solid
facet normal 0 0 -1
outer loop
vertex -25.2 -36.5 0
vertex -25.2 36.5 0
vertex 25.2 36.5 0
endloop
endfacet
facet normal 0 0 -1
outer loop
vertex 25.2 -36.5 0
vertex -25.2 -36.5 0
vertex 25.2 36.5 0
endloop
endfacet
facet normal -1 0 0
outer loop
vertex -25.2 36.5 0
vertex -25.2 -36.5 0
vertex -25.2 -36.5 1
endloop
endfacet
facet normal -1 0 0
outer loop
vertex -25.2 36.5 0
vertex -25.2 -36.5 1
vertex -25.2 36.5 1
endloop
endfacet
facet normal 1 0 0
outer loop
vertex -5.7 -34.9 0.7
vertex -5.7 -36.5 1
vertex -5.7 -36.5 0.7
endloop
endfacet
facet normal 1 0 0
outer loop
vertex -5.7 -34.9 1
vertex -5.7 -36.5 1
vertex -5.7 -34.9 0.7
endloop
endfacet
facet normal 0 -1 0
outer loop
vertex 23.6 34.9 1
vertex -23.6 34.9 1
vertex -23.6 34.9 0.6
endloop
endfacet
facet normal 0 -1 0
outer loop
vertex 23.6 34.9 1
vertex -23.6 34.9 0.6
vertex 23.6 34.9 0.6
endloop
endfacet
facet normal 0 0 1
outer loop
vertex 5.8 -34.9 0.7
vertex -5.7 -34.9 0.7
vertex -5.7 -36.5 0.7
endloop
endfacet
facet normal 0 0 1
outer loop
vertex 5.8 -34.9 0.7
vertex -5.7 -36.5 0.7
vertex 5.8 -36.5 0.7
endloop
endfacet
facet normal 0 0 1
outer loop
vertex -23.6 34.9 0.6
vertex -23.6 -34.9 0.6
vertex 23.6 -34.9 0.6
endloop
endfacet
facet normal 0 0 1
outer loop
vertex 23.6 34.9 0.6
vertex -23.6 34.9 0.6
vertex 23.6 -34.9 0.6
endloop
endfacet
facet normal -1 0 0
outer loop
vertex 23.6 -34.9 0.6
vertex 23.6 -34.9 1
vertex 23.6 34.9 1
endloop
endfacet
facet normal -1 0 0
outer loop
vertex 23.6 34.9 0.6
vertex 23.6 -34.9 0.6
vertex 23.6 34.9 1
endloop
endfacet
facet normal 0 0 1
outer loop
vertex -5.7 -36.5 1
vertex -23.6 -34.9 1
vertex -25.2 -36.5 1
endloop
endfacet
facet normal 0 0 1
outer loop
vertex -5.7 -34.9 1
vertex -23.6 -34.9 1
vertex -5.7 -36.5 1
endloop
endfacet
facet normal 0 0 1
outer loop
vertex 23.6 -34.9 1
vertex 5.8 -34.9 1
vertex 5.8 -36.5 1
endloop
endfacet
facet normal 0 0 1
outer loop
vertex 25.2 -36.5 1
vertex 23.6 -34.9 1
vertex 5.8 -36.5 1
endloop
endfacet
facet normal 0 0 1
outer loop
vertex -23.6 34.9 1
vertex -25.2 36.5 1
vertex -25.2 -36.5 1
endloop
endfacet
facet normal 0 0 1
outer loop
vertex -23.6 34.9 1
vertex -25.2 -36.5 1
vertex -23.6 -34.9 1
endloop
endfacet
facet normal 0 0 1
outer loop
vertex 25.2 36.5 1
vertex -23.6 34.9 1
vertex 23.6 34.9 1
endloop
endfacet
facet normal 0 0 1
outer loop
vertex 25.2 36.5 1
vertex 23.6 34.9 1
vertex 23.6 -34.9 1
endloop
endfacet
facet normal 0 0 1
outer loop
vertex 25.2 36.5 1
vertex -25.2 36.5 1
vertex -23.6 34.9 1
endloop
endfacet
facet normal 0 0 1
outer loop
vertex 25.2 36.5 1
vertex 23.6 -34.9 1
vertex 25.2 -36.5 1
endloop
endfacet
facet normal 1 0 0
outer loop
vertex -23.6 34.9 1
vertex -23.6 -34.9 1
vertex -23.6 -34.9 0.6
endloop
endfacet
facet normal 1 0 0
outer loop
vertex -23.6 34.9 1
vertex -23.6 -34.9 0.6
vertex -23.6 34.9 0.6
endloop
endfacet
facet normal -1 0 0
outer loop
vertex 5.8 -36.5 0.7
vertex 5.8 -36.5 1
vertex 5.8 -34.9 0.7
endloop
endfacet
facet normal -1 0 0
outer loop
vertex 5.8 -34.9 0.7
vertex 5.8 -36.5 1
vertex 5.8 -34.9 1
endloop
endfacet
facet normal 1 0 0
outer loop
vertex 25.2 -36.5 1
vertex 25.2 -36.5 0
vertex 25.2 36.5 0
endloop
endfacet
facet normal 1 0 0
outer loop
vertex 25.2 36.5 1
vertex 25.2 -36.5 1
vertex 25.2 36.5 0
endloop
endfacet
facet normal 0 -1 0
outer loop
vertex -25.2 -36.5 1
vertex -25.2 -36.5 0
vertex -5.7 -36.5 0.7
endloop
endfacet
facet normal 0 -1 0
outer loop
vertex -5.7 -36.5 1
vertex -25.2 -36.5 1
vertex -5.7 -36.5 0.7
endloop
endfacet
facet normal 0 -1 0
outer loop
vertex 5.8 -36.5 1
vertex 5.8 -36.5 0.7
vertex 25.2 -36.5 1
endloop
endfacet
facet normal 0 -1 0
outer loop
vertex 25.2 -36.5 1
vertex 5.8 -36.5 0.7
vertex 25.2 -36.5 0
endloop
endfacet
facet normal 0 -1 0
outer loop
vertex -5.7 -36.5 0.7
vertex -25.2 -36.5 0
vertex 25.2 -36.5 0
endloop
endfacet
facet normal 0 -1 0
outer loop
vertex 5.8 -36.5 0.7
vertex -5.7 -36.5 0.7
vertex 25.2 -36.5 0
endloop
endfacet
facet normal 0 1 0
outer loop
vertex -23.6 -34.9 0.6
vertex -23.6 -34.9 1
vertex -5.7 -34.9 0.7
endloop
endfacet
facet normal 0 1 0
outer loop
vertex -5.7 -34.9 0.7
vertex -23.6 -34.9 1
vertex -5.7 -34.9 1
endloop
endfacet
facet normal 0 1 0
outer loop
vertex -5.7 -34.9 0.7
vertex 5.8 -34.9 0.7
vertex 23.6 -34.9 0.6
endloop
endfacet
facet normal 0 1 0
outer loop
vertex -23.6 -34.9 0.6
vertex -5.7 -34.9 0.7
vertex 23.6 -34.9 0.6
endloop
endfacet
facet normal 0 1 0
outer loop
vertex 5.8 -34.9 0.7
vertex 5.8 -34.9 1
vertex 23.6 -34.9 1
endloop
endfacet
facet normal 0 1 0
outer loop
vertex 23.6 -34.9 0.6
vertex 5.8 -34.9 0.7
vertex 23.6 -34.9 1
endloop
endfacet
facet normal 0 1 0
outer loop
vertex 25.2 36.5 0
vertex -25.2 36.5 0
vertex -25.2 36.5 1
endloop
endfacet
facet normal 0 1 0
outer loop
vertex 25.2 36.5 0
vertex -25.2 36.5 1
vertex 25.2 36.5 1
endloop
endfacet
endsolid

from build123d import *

# Parameters (mm, degrees)
CROQUIS1_W              = 50.4
CROQUIS1_H              = 73
SALIENTE_EXTRUIR1_DEPTH = 1
CROQUIS2_W              = 47.2
CROQUIS2_H              = 69.8
CORTAR_EXTRUIR1_DEPTH   = 0.4
CROQUIS3_W              = 11.5
CROQUIS3_H              = 1.6
CORTAR_EXTRUIR2_DEPTH   = 0.9


with BuildPart() as part:
    # Croquis1 → Saliente-Extruir1 (new body)
    with BuildSketch(Plane.XY):
        Rectangle(CROQUIS1_W, CROQUIS1_H)
    extrude(amount=SALIENTE_EXTRUIR1_DEPTH)

    # Croquis2 → Cortar-Extruir1 (cut)
    with BuildSketch(Plane.XY.offset(1)):
        Rectangle(CROQUIS2_W, CROQUIS2_H)
    extrude(amount=-CORTAR_EXTRUIR1_DEPTH, mode=Mode.SUBTRACT)

    # Croquis3 → Cortar-Extruir2 (cut)
    with BuildSketch(Plane.XY.offset(1.6)):
        with Locations((0.05, -35.7)):
            Rectangle(CROQUIS3_W, CROQUIS3_H)
    extrude(amount=-CORTAR_EXTRUIR2_DEPTH, mode=Mode.SUBTRACT)


solid = part.part
